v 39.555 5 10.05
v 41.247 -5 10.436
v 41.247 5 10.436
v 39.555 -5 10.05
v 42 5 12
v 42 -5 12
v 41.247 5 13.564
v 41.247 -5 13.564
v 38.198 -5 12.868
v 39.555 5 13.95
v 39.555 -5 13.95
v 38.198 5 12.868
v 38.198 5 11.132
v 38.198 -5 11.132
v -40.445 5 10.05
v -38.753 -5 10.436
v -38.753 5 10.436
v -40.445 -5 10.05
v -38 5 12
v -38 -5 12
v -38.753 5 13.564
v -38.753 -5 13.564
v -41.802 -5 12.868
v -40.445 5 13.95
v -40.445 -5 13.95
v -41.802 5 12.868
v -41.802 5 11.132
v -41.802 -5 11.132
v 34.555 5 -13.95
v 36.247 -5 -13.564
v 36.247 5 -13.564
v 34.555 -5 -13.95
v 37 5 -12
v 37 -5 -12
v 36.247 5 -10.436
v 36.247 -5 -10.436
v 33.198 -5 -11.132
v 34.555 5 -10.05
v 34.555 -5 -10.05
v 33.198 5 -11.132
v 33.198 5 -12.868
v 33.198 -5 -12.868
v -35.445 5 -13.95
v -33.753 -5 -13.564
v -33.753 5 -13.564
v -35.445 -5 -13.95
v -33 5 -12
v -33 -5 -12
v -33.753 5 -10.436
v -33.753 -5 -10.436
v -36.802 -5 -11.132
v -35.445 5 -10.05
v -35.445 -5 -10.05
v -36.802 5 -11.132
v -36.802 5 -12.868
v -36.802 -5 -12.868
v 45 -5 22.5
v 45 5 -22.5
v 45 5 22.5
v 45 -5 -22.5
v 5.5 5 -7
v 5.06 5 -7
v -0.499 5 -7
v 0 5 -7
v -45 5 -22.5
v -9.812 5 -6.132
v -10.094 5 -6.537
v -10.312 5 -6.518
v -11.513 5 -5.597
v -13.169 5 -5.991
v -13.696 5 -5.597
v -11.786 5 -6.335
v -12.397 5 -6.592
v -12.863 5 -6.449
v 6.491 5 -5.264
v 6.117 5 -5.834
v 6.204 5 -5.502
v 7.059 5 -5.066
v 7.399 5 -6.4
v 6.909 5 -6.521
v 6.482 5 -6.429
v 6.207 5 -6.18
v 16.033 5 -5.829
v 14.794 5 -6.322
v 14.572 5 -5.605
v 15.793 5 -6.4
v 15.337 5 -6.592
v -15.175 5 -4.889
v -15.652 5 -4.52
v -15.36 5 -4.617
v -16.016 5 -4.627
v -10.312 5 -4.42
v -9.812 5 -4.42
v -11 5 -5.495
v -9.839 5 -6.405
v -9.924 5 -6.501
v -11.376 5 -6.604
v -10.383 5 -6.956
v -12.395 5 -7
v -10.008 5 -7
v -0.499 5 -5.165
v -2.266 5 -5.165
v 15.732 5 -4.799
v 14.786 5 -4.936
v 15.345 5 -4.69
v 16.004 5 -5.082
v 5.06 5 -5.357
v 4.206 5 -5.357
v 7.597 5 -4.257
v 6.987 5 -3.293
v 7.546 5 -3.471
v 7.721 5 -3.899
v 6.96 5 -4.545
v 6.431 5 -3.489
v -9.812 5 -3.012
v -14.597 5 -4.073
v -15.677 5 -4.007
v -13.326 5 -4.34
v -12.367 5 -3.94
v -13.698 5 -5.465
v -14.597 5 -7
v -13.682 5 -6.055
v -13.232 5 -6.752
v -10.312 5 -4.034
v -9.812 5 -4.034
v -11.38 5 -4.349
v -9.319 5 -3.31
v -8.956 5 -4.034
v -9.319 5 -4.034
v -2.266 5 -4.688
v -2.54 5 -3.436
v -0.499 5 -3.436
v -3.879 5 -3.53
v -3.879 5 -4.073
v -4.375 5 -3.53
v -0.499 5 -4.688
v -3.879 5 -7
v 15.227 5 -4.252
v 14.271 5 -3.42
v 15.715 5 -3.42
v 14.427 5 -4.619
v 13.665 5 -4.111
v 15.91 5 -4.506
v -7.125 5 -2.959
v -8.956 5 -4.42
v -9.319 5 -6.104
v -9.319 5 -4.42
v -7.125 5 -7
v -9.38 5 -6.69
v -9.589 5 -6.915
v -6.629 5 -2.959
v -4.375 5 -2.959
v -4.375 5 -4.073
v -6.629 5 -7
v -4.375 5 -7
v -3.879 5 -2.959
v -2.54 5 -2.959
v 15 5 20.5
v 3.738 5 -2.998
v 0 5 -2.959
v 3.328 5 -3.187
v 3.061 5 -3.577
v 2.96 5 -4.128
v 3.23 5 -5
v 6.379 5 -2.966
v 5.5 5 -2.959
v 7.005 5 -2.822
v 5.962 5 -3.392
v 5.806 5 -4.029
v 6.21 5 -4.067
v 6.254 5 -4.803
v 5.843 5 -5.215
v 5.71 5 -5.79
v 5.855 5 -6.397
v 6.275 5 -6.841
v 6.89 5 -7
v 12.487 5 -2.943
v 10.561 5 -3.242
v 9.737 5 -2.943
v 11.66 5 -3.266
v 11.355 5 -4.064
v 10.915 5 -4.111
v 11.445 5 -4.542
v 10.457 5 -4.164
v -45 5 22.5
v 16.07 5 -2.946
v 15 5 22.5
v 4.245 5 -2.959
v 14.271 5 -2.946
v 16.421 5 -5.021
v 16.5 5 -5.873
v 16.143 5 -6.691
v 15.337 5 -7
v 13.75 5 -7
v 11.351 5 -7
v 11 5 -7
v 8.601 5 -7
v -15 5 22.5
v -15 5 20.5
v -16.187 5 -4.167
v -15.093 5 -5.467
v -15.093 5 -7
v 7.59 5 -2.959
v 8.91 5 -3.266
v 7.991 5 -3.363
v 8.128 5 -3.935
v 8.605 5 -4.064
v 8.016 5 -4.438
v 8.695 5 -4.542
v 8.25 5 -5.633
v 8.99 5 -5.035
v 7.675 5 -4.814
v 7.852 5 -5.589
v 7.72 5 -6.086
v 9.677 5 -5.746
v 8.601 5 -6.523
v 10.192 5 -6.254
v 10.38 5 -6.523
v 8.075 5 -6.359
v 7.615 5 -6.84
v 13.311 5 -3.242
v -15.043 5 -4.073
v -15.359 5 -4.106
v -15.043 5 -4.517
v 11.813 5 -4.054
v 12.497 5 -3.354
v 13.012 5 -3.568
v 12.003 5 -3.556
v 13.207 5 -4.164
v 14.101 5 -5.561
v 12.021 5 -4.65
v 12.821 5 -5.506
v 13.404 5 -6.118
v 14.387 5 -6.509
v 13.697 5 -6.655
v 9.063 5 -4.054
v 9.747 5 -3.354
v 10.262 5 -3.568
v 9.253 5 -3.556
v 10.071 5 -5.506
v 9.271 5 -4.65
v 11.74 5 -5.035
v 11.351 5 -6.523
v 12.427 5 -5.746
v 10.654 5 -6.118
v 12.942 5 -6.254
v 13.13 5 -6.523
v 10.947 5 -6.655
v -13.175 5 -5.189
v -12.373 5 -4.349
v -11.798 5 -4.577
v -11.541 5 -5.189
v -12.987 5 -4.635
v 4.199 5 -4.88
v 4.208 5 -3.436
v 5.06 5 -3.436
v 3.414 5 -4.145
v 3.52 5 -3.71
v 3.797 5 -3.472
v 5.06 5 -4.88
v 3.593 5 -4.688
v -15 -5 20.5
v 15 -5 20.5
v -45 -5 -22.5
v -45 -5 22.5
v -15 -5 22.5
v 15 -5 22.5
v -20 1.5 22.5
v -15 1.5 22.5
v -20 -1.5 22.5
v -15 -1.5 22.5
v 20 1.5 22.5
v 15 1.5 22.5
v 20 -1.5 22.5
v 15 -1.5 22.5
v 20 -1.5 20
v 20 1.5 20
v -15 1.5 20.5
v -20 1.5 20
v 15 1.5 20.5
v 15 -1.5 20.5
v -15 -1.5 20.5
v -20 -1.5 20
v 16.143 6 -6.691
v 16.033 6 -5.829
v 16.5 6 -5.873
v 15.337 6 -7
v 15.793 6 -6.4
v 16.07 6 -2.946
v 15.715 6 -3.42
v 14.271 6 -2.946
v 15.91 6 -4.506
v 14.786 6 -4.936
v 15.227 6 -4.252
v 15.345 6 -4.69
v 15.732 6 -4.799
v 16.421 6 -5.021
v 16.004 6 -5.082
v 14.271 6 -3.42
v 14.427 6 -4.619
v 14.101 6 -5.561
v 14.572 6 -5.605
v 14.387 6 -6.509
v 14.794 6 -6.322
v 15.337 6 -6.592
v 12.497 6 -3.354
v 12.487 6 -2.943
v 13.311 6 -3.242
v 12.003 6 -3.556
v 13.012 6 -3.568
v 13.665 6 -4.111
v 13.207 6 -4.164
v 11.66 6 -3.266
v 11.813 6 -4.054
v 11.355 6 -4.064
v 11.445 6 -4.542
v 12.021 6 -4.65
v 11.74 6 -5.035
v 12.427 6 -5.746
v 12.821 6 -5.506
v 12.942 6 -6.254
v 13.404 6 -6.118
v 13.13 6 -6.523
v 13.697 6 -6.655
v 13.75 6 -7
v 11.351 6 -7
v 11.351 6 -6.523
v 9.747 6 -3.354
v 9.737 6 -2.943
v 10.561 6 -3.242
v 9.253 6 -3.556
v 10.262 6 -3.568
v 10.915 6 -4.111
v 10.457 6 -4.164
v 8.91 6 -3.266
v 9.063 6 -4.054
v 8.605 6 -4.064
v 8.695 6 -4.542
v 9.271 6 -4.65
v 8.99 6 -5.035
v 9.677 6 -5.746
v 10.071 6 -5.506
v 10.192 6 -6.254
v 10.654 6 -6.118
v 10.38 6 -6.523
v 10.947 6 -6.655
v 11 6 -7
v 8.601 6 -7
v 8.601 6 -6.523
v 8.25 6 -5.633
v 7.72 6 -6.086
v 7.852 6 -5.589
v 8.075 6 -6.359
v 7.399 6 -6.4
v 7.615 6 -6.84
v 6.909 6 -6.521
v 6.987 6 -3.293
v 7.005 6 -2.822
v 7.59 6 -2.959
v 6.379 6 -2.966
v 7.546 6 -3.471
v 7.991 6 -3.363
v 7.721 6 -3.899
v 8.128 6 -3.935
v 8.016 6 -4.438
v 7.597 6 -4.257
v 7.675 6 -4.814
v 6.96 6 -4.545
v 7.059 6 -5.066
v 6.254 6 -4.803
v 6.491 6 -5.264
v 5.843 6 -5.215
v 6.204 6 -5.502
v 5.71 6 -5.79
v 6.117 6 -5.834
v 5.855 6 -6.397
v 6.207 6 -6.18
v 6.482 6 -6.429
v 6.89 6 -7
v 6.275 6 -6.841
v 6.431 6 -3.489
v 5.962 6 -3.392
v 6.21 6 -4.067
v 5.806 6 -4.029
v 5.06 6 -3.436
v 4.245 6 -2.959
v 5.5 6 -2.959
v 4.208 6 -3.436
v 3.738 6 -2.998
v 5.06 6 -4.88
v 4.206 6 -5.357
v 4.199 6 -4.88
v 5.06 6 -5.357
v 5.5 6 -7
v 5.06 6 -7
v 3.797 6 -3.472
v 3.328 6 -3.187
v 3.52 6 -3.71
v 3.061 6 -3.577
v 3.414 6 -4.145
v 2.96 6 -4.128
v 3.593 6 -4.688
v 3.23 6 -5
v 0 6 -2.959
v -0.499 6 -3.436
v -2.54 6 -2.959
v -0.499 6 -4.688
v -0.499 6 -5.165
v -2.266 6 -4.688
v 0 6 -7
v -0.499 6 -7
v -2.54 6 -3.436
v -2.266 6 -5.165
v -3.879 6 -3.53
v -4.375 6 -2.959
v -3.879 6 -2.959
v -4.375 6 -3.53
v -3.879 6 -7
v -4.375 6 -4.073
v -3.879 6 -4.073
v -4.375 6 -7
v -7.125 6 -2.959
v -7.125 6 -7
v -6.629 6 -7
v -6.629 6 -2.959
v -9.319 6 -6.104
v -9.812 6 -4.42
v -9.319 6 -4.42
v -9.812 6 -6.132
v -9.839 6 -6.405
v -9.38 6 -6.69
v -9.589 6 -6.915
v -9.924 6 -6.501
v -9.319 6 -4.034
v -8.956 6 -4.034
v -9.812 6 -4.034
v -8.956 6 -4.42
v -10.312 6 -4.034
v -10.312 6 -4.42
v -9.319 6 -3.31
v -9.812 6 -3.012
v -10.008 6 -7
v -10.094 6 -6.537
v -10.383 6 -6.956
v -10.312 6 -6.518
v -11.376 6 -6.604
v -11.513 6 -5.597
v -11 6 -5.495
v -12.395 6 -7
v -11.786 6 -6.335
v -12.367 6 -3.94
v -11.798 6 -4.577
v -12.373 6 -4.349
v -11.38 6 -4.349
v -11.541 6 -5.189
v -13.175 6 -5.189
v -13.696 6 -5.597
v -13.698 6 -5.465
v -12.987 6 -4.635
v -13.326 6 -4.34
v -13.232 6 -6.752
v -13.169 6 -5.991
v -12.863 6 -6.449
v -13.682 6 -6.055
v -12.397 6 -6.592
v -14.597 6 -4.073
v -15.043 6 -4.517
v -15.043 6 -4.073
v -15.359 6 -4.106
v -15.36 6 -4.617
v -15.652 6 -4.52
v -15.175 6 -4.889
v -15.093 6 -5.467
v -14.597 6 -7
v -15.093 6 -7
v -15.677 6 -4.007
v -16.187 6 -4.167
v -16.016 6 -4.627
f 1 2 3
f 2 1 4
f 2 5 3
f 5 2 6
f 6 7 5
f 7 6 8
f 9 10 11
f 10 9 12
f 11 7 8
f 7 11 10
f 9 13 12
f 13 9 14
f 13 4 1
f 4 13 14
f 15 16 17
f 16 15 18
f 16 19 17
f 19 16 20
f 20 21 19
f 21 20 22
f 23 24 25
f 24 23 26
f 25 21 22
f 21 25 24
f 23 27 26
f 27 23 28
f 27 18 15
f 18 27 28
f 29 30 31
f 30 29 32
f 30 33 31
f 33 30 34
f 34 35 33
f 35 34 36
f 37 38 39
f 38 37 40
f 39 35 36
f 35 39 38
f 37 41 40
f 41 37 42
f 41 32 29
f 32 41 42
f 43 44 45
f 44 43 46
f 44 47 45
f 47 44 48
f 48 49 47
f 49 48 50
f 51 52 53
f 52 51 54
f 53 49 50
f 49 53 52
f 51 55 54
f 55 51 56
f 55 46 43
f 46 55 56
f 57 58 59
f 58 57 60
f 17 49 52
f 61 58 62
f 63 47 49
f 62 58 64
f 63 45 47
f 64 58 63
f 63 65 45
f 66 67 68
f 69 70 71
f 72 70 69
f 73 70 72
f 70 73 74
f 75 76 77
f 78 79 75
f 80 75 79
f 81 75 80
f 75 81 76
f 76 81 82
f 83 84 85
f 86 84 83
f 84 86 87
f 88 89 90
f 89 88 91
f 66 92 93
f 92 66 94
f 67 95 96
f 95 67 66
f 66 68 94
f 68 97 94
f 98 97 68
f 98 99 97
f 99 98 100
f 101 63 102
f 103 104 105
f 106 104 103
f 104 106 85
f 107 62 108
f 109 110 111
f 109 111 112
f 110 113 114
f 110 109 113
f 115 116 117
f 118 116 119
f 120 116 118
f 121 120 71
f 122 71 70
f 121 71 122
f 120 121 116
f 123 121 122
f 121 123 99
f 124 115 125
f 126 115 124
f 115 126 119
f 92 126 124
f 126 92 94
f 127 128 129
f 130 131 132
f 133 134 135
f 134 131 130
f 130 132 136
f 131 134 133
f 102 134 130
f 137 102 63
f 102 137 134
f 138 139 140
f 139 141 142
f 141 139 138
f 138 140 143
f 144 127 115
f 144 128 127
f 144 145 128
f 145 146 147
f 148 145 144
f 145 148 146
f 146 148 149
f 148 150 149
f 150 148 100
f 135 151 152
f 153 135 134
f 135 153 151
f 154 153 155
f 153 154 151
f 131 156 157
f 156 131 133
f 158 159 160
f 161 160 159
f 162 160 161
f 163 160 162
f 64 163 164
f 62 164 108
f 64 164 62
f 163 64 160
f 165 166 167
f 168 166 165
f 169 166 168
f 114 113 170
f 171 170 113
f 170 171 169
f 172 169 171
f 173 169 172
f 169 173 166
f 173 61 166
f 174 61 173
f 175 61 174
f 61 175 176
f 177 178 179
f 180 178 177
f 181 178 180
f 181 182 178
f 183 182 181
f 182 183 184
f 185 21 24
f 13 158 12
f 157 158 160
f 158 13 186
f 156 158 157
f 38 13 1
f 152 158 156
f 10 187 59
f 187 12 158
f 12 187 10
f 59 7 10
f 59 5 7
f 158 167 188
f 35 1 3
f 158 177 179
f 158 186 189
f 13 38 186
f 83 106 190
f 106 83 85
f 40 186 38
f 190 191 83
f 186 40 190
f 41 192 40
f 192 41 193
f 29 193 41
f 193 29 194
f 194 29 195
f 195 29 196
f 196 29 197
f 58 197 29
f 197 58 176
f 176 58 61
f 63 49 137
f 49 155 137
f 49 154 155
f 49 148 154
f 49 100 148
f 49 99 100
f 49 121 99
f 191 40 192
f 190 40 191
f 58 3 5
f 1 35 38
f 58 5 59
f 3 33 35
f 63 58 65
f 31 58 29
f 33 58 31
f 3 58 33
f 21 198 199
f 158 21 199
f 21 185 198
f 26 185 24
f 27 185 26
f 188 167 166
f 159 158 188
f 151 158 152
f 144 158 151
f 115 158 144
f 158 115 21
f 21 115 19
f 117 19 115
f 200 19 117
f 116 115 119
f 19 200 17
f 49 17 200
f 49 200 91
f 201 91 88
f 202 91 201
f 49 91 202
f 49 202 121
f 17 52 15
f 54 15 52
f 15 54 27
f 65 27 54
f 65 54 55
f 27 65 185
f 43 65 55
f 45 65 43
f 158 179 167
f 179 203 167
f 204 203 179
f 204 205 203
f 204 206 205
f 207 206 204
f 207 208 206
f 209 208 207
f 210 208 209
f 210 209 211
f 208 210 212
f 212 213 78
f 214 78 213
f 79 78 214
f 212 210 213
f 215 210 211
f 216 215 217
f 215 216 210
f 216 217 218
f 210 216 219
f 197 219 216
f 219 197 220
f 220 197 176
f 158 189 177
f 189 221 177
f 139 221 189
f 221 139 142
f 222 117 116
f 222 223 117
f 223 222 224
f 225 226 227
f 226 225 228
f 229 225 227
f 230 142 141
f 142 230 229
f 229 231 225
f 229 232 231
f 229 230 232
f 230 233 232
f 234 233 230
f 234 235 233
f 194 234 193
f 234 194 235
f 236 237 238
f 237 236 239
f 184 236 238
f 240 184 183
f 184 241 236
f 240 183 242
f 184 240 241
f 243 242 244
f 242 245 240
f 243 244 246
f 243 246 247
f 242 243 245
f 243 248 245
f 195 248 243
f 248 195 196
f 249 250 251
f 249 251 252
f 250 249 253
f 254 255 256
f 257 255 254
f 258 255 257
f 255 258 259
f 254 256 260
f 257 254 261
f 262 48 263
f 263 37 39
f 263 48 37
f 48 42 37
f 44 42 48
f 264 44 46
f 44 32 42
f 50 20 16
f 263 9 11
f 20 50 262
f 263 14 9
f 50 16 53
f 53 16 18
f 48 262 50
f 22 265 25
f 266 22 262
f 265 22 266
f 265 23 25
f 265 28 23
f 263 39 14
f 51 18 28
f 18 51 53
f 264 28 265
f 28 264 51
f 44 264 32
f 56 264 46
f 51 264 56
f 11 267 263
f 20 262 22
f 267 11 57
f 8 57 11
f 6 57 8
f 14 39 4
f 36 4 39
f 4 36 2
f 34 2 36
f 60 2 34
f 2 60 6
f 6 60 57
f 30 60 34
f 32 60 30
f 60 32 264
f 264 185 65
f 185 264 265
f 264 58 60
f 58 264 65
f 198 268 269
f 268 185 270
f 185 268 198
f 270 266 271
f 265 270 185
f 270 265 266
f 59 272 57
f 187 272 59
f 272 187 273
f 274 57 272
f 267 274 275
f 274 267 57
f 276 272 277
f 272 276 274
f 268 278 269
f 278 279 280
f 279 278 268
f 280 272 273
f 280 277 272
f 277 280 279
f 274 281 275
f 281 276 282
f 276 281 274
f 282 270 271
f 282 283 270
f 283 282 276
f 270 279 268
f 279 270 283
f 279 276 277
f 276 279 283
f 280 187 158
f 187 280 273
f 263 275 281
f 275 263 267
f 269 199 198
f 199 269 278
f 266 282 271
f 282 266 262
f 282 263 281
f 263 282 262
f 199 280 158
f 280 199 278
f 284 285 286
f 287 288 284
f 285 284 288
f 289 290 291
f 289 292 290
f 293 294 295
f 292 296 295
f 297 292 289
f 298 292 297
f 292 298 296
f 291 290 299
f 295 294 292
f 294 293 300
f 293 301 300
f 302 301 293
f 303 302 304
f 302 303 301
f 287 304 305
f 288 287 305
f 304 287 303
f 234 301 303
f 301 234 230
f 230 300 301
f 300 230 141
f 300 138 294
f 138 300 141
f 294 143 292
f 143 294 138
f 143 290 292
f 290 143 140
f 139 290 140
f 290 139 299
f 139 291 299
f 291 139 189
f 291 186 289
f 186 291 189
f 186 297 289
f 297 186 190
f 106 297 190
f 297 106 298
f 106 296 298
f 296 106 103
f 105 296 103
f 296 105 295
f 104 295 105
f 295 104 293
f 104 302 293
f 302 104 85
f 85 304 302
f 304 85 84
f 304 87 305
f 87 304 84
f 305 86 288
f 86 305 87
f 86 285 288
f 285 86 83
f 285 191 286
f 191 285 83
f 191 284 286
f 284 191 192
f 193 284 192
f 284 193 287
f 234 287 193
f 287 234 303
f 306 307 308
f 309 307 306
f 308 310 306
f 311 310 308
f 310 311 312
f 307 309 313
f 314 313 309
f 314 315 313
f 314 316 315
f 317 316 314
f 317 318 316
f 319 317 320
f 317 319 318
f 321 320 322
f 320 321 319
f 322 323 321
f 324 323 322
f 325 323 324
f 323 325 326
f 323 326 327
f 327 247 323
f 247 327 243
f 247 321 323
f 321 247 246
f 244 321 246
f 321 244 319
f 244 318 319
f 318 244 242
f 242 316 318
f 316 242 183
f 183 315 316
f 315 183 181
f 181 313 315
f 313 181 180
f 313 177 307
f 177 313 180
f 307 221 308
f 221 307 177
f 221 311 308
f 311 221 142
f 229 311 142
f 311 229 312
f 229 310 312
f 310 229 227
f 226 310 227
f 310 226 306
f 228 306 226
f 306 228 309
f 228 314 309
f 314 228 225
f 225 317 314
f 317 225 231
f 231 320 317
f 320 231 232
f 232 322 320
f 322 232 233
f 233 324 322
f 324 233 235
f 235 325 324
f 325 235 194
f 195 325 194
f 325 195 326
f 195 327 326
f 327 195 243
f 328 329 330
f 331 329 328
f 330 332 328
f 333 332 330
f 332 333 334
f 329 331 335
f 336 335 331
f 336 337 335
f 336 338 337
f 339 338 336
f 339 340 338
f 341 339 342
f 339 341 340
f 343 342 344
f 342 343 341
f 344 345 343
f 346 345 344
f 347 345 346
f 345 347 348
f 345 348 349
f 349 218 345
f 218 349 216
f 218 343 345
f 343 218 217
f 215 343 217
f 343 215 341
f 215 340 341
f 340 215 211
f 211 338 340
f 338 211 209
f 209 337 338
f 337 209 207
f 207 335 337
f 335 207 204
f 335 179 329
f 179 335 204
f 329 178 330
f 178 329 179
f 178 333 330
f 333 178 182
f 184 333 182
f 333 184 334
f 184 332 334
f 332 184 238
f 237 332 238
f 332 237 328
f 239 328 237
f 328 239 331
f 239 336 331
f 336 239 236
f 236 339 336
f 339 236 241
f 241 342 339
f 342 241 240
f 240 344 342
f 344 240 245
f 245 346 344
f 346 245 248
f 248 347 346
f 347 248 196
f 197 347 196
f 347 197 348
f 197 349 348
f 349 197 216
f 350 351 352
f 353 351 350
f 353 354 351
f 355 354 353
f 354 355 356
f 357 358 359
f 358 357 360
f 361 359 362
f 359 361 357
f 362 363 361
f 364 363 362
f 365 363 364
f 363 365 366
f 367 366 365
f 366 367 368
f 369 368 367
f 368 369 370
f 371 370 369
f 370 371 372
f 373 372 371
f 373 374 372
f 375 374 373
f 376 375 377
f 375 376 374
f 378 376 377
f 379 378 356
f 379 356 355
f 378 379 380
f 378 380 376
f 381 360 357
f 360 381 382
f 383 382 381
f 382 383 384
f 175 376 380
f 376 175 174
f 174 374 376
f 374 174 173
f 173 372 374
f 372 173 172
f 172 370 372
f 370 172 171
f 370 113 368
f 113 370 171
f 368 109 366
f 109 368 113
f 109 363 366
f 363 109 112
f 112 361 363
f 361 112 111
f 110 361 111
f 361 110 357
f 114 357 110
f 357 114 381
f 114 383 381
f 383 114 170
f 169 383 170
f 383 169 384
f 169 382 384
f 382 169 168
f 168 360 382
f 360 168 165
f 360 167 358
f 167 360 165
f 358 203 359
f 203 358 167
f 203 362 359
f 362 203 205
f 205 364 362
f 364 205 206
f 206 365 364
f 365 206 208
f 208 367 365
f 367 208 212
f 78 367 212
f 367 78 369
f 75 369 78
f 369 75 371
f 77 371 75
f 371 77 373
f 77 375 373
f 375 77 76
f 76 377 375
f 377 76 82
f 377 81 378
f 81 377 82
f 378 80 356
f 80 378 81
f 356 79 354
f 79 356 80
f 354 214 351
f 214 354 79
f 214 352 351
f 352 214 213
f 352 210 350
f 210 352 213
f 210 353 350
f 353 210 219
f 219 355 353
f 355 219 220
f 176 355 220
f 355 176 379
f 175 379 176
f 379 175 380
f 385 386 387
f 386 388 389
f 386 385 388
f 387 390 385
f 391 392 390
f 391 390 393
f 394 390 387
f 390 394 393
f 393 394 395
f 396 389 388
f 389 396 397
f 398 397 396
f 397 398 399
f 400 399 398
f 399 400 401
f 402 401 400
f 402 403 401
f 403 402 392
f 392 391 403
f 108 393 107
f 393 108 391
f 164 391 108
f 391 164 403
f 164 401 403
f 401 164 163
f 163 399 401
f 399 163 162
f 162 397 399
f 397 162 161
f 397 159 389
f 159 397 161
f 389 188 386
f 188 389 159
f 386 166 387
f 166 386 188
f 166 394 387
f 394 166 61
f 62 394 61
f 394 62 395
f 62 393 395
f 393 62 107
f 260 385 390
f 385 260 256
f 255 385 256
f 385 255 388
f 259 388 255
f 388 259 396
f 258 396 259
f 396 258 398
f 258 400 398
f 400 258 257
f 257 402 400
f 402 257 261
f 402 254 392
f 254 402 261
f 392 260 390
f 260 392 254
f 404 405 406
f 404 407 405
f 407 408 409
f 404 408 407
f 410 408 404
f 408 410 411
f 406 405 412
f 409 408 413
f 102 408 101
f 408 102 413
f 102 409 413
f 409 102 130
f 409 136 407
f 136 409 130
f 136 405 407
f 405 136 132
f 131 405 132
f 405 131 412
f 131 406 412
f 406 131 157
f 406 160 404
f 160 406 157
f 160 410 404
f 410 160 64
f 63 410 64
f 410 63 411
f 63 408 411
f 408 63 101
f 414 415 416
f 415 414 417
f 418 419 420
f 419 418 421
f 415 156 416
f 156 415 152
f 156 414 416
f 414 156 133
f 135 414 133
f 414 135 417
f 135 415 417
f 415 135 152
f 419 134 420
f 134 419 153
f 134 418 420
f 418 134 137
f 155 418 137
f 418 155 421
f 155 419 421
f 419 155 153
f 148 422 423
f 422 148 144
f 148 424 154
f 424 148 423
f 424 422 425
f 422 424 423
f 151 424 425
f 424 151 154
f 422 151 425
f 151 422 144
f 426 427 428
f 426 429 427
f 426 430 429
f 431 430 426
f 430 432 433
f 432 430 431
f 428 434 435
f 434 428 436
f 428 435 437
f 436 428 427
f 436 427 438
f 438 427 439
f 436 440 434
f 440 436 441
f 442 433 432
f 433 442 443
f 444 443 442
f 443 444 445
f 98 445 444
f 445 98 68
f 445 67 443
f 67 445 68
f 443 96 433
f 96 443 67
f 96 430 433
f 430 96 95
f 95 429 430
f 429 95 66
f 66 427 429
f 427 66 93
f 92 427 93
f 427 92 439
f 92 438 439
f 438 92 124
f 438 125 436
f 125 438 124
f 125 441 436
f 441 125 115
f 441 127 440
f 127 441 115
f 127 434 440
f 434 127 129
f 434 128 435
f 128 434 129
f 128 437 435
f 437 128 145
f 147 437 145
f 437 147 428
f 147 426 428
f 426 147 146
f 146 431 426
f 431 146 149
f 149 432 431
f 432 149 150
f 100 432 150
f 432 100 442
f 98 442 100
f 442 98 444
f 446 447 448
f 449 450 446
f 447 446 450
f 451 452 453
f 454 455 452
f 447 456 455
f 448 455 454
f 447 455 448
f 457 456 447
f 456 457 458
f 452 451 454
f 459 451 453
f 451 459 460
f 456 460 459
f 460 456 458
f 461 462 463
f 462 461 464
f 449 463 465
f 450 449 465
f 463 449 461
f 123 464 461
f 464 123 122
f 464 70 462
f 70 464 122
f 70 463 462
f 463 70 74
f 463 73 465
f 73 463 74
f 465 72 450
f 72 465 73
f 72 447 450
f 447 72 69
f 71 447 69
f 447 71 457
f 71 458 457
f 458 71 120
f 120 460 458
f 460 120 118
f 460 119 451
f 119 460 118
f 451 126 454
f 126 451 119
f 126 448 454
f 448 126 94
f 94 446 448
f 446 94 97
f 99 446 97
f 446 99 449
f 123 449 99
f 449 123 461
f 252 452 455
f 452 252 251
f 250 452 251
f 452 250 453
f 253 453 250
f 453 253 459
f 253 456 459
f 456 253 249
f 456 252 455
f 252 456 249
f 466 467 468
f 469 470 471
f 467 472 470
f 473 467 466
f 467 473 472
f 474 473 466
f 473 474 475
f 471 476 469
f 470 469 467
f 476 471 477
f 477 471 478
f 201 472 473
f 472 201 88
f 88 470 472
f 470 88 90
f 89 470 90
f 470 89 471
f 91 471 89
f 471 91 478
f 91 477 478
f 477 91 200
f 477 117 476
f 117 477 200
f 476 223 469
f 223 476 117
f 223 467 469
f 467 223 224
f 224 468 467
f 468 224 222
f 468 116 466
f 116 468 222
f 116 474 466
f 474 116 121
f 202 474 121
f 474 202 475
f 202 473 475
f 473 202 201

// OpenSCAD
// file: filterMount_screwHoles.scad
module upperScrewHoles(){
	//upperMiddleHalf
	translate([40,12,0]) cylinder(h=30,r=2,center=true);
	translate([-40,12,0]) cylinder(h=30,r=2,center=true);
	//upperHalf
	translate([35,-12,0]) cylinder(h=30,r=2,center=true);
	translate([-35,-12,0]) cylinder(h=30,r=2,center=true);
}

module lowerScrewHoles(){
	//lowerMiddleHalf
	translate([40,-12,0]) cylinder(h=30,r=2,center=true);
	translate([-40,-12,0]) cylinder(h=30,r=2,center=true);
	//bottomwHalf
	translate([35,12,0]) cylinder(h=30,r=2,center=true);
	translate([-35,12,0]) cylinder(h=30,r=2,center=true);
}

upperScrewHoles();
lowerScrewHoles();
// main file
use <write.scad>
use <filterMount_screwHoles.scad>

module 522SP_filterMountBottom(){
	//522SP Filter Mount Bottom
	difference(){
		//mountBody
		color([.2,.1,.6]) cube(size=[90,45,10],center=true);
		//filterBody
		translate([0,-22.5,0]) cube(size=[40,5,3],center=true);
		//filterHole
		translate([0,-22.5,0]) cube(size=[30,4,20],center=true);
		//screwHoles
		lowerScrewHoles();
	}
	rotate([0,0,180]){
		translate([0,-5,4.5]){
			write("522SP Filter",h=4,t=3,center=true);
		}
	}
}

rotate([-90,0,0]) translate([0,0,0]){
	522SP_filterMountBottom();
}
